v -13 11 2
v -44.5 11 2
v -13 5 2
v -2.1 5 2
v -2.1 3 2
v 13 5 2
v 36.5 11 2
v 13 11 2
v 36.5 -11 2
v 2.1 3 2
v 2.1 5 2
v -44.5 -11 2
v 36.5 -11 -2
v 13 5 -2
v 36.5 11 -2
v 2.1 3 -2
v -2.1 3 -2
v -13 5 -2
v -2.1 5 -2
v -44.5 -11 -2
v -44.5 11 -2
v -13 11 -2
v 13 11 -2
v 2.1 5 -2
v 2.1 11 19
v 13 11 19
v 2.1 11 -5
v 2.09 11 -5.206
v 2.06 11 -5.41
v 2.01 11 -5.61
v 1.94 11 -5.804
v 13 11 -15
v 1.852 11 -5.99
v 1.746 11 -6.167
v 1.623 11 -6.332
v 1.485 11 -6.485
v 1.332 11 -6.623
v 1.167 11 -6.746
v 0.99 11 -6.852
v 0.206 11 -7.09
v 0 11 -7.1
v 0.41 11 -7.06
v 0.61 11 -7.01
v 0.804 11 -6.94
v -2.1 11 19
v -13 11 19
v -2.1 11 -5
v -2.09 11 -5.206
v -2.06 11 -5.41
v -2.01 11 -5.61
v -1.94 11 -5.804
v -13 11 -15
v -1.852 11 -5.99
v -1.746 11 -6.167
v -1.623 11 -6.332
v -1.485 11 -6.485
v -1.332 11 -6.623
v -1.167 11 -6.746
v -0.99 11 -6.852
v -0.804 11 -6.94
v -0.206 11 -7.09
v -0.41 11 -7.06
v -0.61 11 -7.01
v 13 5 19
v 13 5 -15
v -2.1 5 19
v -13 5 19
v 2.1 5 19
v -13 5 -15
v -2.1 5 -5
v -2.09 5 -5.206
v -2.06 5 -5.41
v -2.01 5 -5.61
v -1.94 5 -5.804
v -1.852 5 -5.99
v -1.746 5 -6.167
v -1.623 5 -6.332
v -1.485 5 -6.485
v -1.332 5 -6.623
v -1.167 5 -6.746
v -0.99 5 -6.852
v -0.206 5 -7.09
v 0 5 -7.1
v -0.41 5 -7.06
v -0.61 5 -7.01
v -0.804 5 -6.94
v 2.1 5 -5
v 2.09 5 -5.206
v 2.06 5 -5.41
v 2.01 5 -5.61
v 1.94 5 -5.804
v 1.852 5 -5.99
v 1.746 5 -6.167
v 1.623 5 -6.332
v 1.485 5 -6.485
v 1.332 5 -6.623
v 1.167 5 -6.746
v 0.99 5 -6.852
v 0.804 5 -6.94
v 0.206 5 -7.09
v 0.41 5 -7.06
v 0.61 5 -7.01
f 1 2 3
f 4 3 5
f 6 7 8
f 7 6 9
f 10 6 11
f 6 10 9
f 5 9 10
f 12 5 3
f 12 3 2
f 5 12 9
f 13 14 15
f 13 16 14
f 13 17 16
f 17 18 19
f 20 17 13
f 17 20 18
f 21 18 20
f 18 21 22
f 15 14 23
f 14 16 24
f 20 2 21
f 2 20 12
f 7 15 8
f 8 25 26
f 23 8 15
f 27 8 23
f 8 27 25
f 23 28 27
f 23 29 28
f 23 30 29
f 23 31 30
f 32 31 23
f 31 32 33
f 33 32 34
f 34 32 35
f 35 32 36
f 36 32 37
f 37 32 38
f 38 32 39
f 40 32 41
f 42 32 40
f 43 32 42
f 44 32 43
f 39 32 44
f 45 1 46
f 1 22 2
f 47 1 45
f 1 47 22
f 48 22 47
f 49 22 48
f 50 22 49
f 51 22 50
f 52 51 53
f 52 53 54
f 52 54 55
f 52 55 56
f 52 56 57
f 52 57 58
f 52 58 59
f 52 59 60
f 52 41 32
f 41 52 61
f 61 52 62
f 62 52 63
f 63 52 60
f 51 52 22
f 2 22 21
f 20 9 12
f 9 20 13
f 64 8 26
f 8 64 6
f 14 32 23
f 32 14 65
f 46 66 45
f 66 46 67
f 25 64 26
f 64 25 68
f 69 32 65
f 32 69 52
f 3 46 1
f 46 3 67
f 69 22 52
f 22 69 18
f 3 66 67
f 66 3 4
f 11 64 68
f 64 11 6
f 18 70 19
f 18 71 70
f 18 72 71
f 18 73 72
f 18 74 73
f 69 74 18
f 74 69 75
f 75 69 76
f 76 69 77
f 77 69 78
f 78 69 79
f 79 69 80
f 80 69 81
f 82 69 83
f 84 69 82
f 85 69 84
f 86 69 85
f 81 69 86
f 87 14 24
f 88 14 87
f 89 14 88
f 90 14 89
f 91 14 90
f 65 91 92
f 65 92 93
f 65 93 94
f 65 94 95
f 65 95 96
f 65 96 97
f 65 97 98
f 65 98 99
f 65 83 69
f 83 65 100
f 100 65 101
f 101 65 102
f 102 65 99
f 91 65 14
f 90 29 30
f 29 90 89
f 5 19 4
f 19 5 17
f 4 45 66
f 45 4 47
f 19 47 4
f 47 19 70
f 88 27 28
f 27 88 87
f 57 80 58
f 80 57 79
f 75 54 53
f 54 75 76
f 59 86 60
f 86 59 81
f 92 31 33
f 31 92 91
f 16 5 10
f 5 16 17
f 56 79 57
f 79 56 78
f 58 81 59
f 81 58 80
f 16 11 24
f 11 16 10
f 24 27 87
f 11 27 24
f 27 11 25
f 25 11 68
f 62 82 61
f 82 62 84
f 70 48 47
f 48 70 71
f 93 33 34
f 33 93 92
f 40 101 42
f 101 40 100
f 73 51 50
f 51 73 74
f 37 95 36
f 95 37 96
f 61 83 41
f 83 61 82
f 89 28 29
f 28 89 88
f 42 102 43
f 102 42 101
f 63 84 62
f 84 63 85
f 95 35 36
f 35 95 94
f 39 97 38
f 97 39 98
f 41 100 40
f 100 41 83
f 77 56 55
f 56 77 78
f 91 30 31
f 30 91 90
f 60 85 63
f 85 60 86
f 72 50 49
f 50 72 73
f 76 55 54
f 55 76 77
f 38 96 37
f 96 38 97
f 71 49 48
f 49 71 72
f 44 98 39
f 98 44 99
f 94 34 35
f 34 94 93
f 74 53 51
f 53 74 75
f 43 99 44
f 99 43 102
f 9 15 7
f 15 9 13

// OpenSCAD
// file: params.scad
// ============================================================================
//  Робосумо 3 кг — спільні параметри
//  Усі розміри в міліметрах. Прав завжди тут, а не в окремих деталях.
//
//  Позначки:
//    ✅  підтверджено з даташита виробника
//    ❓  VERIFY — виміряй свою деталь штангенциркулем і виправ
// ============================================================================

// --- габарит робота ---------------------------------------------------------
CHASSIS_W       = 200;      // ✅ ліміт класу 200 x 200 мм
CHASSIS_L       = 200;
PLATE_T         = 6;        // товщина друкованого прототипу основи
ALLOY_T         = 4;        // товщина алюмінієвої бойової основи

// --- колеса -----------------------------------------------------------------
WHEEL_D         = 50;
WHEEL_W         = 15;
WHEEL_TRACK     = 150;      // між центрами коліс уздовж осі X
WHEELBASE       = 130;      // між центрами коліс уздовж осі Y

// --- мотор Pololu 37D (✅ усі з pololu.com/product/4745) --------------------
MOTOR_BODY_D    = 37;       // ✅ діаметр корпусу редуктора
MOTOR_SHAFT_D   = 6;        // ✅ D-подібний вал
MOTOR_SHAFT_L   = 16;       // ✅ довжина вала
MOTOR_HEX_PITCH = 15.5;     // ✅ суміжні отвори кріплення, правильний шестикутник
MOTOR_HEX_R     = MOTOR_HEX_PITCH / sqrt(3);   // ≈ 8.949 радіус описаного кола
MOTOR_SCREW_MAX = 3;        // ✅ Pololu: НЕ закручувати глибше 3 мм — дістане шестерні
MOTOR_TOTAL_L   = 57;       // ✅ 37Dx57L

// --- кріплення --------------------------------------------------------------
M3_CLEAR        = 3.4;
M3_TAP          = 2.9;
M2_CLEAR        = 2.2;
HEATSET_M3_D    = 4.0;      // отвір під термозакладну гайку M3
HEATSET_M3_H    = 5.7;

// --- плати (❓ виміряй свої) ------------------------------------------------
NANO_W          = 18;       // ✅ стандарт Arduino Nano
NANO_L          = 45;
NANO_HOLE_DX    = 15.24;    // ✅ 0.6 дюйма
NANO_HOLE_DY    = 43.18;    // ✅ 1.7 дюйма

BTS_W           = 25;       // ❓ VERIFY — плата BTS7960 / IBT-2
BTS_L           = 50;       // ❓ VERIFY
BTS_HOLE_DX     = 15;       // ❓ VERIFY
BTS_HOLE_DY     = 44;       // ❓ VERIFY
BTS_QTY         = 4;

QTR_W           = 12;       // ❓ VERIFY — Pololu QTR-8A
QTR_L           = 75;       // ❓ VERIFY
QTR_HOLE_DX     = 10;       // ❓ VERIFY
QTR_HOLE_DY     = 67;       // ❓ VERIFY

// --- акумулятор (❓ виміряй свій) -------------------------------------------
LIP_W           = 34;       // ❓ VERIFY — 6S 2200 мА·год
LIP_L           = 105;      // ❓ VERIFY
LIP_H           = 26;       // ❓ VERIFY

// --- клин -------------------------------------------------------------------
BLADE_W         = 190;
BLADE_T         = 3;
BLADE_ANGLE     = 12;       // ✅ наш вибір: 8–12° за «Blackbook»
BLADE_SCREWS    = 4;

// --- серво ------------------------------------------------------------------
SERVO_W         = 23;       // SG90
SERVO_L         = 32.5;
SERVO_H         = 29;

// --- магніти -----------------------------------------------------------------
MAG_W           = 20;       // 20 x 20 x 5 мм N52
MAG_D           = 5;

// --- якість друку -----------------------------------------------------------
$fn = 64;                   // гладкість круглих отворів
EPS = 0.01;                 // мікро-перекриття для булевих операцій

// ============================================================================
//  Допоміжні модулі
// ============================================================================

// Отвір під гвинт M3 з фаскою, щоб гвинт сідав рівно
module m3_hole(h = 20, head = true) {
    cylinder(d = M3_CLEAR, h = h + 2*EPS, center = true);
    if (head)
        translate([0, 0, h/2])
            cylinder(d1 = M3_CLEAR, d2 = 6.2, h = 1.6);
}

// Отвір під термозакладну гайку M3 (зверху вниз)
module heatset_hole() {
    cylinder(d = HEATSET_M3_D, h = HEATSET_M3_H, center = false);
    translate([0, 0, HEATSET_M3_H])
        cylinder(d = M3_CLEAR, h = 20);
}

// Шість отворів кріплення мотора 37D на правильному шестикутнику.
// Суміжні отвори рознесені рівно на MOTOR_HEX_PITCH.
module motor_mount_holes(depth = 20) {
    for (a = [0 : 60 : 359])
        rotate([0, 0, a])
            translate([MOTOR_HEX_R, 0, 0])
                cylinder(d = M3_CLEAR, h = depth + 2*EPS, center = true);
}

// Шестикутна кишеня під корпус мотора — щоб мотор сів у площину
module motor_body_pocket(depth = 2) {
    translate([0, 0, -depth/2])
        cylinder(d = MOTOR_BODY_D + 0.4, h = depth + EPS, center = true);
}

// Масив отворів по колу — для маточин і фланців
module bolt_circle(dia, n, hole_d = M3_CLEAR, depth = 20) {
    for (i = [0 : n-1])
        rotate([0, 0, i * 360 / n])
            translate([dia/2, 0, 0])
                cylinder(d = hole_d, h = depth + 2*EPS, center = true);
}

// Плита зі скругленими кутами
module rounded_plate(w, h, t, r = 8) {
    linear_extrude(height = t)
        offset(r = r) offset(delta = -r)
            square([w - 2*r, h - 2*r], center = true);
}
// main file
// ============================================================================
//  04 — Кріплення QTR-8A на планці клина
//  Тримає сенсорну планку на висоті 1.5–2 мм над ареною — це критично,
//  бо кожен міліметр кліренсу краде притискну силу магнітів.
// ============================================================================

include <params.scad>

MOUNT_T     = 4;
MOUNT_SLOT  = 4.2;      // паз, щоб регулювати висоту після складання
SENSOR_GAP  = 1.75;     // робоча висота сенсорів над підлогою

module sensor_mount() {
    W = QTR_L + 14;
    H = 22;

    difference() {
        union() {
            // площина кріплення сенсора
            translate([0, 0, 0])
                cube([W, H, MOUNT_T], center = true);

            // вертикальна стійка з пазом під регулювання висоти
            translate([0, H/2 - 3, MOUNT_T/2])
                cube([26, 6, 34], center = true);
        }

        // отвори під сенсорну планку
        for (dy = [-QTR_HOLE_DY/2, QTR_HOLE_DY/2],
             dx = [-QTR_HOLE_DX/2, QTR_HOLE_DX/2])
            translate([dx, dy, -MOUNT_T])
                cylinder(d = M2_CLEAR, h = MOUNT_T + 2*EPS + 1);

        // паз регулювання висоти в стійці
        translate([0, H/2 - 3, MOUNT_T/2 + 5])
            hull() {
                translate([0, 0, -12]) rotate([90, 0, 0])
                    cylinder(d = MOUNT_SLOT, h = 10, center = true);
                translate([0, 0,  12]) rotate([90, 0, 0])
                    cylinder(d = MOUNT_SLOT, h = 10, center = true);
            }

        // болт кріплення до основи
        translate([0, H/2 - 3, MOUNT_T/2 + 14])
            rotate([90, 0, 0])
                cylinder(d = M3_CLEAR, h = 20, center = true);

        // виріз, щоб не заважати клину
        translate([W/2, 0, 0])
            cube([16, H + 4, MOUNT_T + 4], center = true);
    }
}

sensor_mount();
